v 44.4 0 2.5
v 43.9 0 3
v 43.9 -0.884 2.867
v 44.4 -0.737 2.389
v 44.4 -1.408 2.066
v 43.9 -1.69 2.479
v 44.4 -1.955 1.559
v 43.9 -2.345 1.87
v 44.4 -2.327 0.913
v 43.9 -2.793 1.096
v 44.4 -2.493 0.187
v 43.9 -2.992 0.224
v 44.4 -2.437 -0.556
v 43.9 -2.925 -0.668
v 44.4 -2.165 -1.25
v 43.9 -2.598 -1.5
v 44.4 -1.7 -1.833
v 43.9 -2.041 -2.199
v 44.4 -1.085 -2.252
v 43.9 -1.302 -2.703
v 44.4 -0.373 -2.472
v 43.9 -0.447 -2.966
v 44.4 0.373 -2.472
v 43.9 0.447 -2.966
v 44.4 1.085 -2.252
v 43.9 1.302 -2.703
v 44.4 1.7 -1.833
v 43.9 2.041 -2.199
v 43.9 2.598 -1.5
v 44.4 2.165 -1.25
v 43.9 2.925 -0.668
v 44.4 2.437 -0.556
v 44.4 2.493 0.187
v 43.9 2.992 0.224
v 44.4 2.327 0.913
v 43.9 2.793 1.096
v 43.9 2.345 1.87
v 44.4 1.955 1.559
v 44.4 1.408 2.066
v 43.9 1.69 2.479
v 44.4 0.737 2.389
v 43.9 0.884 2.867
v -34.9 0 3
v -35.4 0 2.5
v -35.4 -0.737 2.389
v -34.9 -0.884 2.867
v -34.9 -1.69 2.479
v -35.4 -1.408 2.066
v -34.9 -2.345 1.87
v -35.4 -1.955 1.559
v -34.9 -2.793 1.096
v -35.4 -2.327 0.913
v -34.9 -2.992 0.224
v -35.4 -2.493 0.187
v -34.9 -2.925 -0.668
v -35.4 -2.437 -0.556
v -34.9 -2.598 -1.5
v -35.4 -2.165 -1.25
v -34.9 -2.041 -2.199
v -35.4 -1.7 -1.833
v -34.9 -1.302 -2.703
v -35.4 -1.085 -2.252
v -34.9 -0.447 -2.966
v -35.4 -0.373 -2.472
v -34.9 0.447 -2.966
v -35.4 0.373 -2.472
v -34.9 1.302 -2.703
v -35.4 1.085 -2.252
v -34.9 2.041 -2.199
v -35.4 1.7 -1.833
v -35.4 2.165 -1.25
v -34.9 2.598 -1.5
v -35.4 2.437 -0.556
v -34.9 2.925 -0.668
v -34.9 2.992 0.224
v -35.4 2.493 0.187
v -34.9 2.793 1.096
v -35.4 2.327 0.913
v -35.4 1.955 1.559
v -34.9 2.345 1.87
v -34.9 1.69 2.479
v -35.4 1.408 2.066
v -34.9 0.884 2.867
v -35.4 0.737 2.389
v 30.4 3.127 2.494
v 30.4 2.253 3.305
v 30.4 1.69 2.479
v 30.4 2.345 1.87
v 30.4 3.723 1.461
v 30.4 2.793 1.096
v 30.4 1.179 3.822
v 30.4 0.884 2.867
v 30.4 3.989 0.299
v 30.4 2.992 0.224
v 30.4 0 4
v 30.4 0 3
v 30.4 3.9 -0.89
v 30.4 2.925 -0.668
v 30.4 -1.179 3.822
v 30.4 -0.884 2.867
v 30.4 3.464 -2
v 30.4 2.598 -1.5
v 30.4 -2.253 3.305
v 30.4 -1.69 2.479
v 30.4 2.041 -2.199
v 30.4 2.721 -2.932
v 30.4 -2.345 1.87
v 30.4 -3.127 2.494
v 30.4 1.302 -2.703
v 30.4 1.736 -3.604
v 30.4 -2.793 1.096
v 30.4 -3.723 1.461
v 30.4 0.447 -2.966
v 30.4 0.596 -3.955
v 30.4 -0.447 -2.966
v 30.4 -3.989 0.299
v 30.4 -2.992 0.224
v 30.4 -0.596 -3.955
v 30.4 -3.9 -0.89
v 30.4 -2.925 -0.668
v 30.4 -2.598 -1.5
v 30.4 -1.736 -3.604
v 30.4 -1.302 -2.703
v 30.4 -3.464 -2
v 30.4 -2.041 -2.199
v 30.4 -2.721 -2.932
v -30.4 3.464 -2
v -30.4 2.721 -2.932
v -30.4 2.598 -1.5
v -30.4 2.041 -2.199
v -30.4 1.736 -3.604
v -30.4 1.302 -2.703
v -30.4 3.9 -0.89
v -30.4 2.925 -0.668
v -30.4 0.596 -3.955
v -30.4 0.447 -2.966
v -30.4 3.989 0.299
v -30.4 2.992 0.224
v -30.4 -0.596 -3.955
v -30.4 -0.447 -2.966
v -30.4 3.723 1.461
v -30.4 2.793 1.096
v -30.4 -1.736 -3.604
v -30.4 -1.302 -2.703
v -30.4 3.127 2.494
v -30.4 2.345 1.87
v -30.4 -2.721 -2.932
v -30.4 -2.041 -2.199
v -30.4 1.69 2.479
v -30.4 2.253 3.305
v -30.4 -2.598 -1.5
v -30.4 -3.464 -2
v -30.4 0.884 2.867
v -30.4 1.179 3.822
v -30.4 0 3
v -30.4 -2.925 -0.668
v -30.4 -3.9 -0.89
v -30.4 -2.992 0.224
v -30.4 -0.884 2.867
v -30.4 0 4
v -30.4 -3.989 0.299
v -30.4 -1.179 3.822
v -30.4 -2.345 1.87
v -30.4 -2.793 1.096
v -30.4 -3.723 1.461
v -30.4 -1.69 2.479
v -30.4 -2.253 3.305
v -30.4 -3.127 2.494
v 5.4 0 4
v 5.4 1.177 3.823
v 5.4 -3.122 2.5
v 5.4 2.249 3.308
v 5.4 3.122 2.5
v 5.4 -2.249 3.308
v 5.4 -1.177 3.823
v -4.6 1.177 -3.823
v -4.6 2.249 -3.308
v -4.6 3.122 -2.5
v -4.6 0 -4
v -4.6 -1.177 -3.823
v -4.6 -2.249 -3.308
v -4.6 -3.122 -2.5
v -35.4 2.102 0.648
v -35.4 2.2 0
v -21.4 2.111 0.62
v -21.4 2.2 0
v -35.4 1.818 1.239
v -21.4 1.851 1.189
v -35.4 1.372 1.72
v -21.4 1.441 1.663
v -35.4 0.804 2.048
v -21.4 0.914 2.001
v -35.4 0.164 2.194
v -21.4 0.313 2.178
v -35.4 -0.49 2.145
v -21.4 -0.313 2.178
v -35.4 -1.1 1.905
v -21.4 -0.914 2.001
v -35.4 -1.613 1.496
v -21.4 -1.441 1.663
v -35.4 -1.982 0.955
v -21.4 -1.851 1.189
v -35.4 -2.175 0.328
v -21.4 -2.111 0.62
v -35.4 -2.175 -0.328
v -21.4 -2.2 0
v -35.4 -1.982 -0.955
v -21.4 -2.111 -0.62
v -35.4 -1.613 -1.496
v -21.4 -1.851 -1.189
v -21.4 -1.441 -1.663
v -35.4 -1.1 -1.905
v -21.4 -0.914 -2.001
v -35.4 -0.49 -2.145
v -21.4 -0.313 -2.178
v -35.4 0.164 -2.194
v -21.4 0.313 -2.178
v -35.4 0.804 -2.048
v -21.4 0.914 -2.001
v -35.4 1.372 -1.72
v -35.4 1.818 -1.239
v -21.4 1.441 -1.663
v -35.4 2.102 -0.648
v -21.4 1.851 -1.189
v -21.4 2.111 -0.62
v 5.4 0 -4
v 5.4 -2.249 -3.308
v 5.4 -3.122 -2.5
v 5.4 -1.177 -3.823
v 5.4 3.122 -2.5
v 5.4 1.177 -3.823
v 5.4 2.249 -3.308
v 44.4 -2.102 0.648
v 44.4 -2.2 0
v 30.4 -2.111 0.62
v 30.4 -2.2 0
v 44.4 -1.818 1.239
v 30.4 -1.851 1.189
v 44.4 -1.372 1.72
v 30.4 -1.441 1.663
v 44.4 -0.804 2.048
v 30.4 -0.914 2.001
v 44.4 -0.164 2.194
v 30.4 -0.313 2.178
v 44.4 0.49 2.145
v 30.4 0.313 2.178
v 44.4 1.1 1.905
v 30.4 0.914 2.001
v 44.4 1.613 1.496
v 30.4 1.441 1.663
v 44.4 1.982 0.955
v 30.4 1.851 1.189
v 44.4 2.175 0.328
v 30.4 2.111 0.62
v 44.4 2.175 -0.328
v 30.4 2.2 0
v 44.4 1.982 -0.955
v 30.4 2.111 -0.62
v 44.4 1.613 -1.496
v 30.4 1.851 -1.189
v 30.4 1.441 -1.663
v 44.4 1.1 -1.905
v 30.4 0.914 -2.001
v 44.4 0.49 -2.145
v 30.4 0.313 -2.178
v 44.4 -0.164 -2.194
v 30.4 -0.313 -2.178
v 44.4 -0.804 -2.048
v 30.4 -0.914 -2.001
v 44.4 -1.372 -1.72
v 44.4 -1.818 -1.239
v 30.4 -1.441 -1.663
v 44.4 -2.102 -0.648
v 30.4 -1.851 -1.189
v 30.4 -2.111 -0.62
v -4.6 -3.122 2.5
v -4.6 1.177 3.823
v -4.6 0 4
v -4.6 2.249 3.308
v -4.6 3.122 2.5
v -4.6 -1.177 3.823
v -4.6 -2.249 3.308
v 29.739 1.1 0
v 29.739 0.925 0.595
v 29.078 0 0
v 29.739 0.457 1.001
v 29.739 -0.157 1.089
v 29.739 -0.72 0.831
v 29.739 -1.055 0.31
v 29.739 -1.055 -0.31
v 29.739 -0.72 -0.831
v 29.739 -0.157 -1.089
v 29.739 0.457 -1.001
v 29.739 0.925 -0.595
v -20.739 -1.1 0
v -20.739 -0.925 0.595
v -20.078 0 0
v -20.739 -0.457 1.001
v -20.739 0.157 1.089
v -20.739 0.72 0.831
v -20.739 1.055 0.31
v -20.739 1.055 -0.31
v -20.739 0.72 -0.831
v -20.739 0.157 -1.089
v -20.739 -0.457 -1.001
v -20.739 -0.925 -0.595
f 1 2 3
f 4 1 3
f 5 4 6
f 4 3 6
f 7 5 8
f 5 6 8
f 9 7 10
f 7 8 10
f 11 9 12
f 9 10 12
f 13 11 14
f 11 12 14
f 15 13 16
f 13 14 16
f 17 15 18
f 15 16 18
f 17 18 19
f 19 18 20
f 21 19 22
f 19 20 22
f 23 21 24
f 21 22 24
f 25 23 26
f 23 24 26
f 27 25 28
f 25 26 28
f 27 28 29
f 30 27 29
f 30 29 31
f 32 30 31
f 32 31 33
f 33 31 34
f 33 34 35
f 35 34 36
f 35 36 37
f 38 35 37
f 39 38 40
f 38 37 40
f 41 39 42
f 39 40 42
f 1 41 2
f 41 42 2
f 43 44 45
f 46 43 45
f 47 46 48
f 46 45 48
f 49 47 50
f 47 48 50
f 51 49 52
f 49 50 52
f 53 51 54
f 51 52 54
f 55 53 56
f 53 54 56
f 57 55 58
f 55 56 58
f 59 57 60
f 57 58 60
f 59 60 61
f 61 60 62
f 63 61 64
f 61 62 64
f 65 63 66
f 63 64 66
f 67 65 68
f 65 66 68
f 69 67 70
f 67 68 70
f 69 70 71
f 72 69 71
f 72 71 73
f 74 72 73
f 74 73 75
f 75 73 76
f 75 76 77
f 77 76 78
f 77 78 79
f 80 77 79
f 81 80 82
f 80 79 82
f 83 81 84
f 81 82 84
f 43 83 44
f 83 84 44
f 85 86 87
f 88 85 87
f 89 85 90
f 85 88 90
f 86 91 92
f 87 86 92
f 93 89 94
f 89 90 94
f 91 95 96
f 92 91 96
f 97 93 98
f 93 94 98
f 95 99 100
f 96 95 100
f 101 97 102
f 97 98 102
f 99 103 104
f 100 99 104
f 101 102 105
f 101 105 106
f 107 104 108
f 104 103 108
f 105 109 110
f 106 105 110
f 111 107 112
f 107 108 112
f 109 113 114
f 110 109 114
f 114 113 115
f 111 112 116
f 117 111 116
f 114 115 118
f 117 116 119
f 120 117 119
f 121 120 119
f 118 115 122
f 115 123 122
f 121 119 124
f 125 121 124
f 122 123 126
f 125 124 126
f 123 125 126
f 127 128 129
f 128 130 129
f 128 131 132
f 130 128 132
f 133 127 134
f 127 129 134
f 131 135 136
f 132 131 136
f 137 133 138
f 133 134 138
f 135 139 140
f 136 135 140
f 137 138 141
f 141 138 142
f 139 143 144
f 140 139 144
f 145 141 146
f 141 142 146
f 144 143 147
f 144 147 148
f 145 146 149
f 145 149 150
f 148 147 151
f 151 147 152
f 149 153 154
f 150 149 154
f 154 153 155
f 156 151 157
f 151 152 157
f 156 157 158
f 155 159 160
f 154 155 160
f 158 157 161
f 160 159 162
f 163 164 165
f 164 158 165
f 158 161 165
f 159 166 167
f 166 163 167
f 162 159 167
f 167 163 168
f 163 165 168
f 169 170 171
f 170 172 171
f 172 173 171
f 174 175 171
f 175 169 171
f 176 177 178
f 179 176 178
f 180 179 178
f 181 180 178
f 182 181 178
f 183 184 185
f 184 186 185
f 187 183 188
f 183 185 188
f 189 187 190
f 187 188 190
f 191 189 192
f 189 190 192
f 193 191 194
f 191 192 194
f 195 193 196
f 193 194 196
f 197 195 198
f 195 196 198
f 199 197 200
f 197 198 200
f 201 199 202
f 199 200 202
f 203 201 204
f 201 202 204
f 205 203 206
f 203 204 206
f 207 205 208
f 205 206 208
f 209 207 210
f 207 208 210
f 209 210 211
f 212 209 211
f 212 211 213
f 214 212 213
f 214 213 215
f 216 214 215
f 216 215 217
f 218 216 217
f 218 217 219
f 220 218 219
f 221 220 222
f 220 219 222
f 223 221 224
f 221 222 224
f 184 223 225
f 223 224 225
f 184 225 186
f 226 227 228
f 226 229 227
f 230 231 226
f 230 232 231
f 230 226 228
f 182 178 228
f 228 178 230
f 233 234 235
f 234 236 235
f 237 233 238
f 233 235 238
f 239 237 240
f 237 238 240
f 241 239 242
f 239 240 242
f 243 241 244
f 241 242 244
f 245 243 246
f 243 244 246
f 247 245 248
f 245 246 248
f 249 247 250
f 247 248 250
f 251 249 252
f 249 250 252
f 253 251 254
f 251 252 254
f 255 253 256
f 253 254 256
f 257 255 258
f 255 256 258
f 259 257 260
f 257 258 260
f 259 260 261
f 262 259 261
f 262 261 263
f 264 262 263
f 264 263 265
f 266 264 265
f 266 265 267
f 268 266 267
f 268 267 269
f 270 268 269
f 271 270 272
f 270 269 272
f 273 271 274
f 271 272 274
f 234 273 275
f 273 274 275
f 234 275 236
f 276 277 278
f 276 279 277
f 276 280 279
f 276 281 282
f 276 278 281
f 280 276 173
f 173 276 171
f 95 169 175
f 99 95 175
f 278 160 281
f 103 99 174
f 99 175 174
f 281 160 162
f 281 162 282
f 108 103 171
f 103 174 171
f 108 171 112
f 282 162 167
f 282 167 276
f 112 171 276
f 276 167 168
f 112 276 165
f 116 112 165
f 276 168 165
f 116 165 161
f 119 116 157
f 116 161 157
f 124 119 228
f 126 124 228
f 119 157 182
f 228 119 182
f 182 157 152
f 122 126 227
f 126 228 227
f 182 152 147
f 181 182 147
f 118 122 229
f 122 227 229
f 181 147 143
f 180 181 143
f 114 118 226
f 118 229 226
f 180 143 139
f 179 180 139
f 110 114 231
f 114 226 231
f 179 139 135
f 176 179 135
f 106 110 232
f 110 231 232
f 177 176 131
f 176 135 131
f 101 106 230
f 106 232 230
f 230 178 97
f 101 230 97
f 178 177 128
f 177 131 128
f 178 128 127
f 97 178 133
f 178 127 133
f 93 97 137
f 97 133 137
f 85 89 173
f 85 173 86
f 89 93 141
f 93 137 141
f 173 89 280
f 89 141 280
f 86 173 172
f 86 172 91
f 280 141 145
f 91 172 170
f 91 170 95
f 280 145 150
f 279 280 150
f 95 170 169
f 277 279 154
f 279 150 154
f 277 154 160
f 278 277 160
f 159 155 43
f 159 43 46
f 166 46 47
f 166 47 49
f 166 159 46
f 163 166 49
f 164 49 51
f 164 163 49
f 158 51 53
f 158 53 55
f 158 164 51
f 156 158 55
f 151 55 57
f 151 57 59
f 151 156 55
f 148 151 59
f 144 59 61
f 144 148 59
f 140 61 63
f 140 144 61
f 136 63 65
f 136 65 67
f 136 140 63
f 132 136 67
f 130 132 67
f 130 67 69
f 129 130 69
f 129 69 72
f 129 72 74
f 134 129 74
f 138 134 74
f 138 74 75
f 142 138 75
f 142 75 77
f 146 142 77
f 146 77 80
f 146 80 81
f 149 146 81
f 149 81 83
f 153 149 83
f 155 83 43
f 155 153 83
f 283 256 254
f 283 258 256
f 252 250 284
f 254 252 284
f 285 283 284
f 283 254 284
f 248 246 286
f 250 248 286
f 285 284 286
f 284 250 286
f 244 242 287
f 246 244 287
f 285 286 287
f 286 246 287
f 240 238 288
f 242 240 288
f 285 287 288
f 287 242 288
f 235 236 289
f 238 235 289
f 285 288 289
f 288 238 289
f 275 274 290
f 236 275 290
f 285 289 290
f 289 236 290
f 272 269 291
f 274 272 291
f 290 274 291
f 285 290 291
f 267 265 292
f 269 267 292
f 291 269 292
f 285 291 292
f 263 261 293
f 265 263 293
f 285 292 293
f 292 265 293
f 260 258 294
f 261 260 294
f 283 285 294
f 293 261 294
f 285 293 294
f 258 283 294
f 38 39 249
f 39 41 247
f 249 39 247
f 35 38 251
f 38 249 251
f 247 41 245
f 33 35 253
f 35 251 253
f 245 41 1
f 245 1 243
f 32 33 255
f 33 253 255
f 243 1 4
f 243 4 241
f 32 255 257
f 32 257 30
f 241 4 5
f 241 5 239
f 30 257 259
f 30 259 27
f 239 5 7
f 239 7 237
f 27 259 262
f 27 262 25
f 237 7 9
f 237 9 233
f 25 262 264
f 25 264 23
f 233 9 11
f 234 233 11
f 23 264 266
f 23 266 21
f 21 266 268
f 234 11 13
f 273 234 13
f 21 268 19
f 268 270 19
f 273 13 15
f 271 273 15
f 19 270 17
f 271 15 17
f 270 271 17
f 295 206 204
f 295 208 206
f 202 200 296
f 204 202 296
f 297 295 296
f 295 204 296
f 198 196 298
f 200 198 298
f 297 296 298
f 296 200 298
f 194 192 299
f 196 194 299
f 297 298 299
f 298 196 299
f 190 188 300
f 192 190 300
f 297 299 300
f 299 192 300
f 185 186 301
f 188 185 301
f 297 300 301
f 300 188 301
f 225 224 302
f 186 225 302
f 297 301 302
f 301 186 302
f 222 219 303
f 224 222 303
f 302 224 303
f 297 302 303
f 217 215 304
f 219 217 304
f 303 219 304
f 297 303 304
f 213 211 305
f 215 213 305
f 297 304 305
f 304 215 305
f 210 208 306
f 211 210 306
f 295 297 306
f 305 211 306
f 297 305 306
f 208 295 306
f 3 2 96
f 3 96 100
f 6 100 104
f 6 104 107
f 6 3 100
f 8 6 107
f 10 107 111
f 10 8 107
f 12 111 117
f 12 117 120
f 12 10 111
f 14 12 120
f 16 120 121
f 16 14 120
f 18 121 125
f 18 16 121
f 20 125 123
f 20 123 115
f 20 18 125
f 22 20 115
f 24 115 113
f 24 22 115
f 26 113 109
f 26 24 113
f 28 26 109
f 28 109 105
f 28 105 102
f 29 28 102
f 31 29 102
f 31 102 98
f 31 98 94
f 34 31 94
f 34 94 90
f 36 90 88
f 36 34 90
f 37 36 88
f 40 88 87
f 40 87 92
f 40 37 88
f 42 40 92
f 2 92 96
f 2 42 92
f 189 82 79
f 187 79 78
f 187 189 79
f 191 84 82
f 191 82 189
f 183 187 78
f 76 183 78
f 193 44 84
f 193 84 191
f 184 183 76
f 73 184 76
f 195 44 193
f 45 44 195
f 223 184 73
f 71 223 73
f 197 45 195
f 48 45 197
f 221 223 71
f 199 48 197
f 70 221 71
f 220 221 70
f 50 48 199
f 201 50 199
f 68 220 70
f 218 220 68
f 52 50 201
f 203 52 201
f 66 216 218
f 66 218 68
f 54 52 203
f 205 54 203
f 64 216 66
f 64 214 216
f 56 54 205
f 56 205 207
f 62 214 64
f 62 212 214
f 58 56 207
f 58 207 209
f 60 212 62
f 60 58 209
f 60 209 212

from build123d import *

# Parameters (mm, degrees)
F0_W     = 5
F0_H     = 3
F0_W_2   = 14
F3_SIZE  = 0.5
F4_D     = 4.4
F4_DEPTH = 14
F4_TIP   = 1.3218933619
F5_SIZE  = 0.5
F7_D     = 4.4
F7_DEPTH = 14
F7_TIP   = 1.3218933619
F8_W     = 10
F8_H     = 1.5
F9_DEPTH = 10


with BuildPart() as f1:
    # F0 (on Front) → F1 (revolve)
    with BuildSketch(Plane.XZ):
        Polygon((-30.4, 3), (-30.4, 0), (30.4, 0), (30.4, 3), (30.4, 4), (5, 4), (-5, 4), (-30.4, 4), align=None)
        with Locations((-32.9, 1.5)):
            Rectangle(F0_W, F0_H)
        with Locations((37.4, 1.5)):
            Rectangle(F0_W_2, F0_H)
    revolve(axis=Axis((7.3750944167, 0, 0), (1, 0, 0)))

    # F3
    f3_edges = [f1.edges().sort_by_distance(p)[0] for p in [
        (44.4, 0, -3),
    ]]
    chamfer(f3_edges, length=F3_SIZE)

    # F4
    with Locations(Plane.YZ.offset(44.4)):
        with Locations((0, 0)):
            Hole(F4_D / 2, depth=F4_DEPTH)
            with Locations((0, 0, -(F4_DEPTH + F4_TIP / 2))):  # 118° drill point
                Cone(0, F4_D / 2, F4_TIP, mode=Mode.SUBTRACT)

    # F5
    f5_edges = [f1.edges().sort_by_distance(p)[0] for p in [
        (-35.4, 0, -3),
    ]]
    chamfer(f5_edges, length=F5_SIZE)

    # F7
    with Locations(Plane(origin=(-35.4, 0, 0), x_dir=(0, -1, 0), z_dir=(-1, 0, 0))):
        with Locations((0, 0)):
            Hole(F7_D / 2, depth=F7_DEPTH)
            with Locations((0, 0, -(F7_DEPTH + F7_TIP / 2))):  # 118° drill point
                Cone(0, F7_D / 2, F7_TIP, mode=Mode.SUBTRACT)

    # F8 (on Front) → F9 (cut, symmetric)
    with BuildSketch(Plane.XZ):
        with Locations((0.4, -3.25)):
            Rectangle(F8_W, F8_H)
        with Locations((0.4, 3.25)):
            Rectangle(F8_W, F8_H)
    extrude(amount=F9_DEPTH, both=True, mode=Mode.SUBTRACT)


solid = f1.part
